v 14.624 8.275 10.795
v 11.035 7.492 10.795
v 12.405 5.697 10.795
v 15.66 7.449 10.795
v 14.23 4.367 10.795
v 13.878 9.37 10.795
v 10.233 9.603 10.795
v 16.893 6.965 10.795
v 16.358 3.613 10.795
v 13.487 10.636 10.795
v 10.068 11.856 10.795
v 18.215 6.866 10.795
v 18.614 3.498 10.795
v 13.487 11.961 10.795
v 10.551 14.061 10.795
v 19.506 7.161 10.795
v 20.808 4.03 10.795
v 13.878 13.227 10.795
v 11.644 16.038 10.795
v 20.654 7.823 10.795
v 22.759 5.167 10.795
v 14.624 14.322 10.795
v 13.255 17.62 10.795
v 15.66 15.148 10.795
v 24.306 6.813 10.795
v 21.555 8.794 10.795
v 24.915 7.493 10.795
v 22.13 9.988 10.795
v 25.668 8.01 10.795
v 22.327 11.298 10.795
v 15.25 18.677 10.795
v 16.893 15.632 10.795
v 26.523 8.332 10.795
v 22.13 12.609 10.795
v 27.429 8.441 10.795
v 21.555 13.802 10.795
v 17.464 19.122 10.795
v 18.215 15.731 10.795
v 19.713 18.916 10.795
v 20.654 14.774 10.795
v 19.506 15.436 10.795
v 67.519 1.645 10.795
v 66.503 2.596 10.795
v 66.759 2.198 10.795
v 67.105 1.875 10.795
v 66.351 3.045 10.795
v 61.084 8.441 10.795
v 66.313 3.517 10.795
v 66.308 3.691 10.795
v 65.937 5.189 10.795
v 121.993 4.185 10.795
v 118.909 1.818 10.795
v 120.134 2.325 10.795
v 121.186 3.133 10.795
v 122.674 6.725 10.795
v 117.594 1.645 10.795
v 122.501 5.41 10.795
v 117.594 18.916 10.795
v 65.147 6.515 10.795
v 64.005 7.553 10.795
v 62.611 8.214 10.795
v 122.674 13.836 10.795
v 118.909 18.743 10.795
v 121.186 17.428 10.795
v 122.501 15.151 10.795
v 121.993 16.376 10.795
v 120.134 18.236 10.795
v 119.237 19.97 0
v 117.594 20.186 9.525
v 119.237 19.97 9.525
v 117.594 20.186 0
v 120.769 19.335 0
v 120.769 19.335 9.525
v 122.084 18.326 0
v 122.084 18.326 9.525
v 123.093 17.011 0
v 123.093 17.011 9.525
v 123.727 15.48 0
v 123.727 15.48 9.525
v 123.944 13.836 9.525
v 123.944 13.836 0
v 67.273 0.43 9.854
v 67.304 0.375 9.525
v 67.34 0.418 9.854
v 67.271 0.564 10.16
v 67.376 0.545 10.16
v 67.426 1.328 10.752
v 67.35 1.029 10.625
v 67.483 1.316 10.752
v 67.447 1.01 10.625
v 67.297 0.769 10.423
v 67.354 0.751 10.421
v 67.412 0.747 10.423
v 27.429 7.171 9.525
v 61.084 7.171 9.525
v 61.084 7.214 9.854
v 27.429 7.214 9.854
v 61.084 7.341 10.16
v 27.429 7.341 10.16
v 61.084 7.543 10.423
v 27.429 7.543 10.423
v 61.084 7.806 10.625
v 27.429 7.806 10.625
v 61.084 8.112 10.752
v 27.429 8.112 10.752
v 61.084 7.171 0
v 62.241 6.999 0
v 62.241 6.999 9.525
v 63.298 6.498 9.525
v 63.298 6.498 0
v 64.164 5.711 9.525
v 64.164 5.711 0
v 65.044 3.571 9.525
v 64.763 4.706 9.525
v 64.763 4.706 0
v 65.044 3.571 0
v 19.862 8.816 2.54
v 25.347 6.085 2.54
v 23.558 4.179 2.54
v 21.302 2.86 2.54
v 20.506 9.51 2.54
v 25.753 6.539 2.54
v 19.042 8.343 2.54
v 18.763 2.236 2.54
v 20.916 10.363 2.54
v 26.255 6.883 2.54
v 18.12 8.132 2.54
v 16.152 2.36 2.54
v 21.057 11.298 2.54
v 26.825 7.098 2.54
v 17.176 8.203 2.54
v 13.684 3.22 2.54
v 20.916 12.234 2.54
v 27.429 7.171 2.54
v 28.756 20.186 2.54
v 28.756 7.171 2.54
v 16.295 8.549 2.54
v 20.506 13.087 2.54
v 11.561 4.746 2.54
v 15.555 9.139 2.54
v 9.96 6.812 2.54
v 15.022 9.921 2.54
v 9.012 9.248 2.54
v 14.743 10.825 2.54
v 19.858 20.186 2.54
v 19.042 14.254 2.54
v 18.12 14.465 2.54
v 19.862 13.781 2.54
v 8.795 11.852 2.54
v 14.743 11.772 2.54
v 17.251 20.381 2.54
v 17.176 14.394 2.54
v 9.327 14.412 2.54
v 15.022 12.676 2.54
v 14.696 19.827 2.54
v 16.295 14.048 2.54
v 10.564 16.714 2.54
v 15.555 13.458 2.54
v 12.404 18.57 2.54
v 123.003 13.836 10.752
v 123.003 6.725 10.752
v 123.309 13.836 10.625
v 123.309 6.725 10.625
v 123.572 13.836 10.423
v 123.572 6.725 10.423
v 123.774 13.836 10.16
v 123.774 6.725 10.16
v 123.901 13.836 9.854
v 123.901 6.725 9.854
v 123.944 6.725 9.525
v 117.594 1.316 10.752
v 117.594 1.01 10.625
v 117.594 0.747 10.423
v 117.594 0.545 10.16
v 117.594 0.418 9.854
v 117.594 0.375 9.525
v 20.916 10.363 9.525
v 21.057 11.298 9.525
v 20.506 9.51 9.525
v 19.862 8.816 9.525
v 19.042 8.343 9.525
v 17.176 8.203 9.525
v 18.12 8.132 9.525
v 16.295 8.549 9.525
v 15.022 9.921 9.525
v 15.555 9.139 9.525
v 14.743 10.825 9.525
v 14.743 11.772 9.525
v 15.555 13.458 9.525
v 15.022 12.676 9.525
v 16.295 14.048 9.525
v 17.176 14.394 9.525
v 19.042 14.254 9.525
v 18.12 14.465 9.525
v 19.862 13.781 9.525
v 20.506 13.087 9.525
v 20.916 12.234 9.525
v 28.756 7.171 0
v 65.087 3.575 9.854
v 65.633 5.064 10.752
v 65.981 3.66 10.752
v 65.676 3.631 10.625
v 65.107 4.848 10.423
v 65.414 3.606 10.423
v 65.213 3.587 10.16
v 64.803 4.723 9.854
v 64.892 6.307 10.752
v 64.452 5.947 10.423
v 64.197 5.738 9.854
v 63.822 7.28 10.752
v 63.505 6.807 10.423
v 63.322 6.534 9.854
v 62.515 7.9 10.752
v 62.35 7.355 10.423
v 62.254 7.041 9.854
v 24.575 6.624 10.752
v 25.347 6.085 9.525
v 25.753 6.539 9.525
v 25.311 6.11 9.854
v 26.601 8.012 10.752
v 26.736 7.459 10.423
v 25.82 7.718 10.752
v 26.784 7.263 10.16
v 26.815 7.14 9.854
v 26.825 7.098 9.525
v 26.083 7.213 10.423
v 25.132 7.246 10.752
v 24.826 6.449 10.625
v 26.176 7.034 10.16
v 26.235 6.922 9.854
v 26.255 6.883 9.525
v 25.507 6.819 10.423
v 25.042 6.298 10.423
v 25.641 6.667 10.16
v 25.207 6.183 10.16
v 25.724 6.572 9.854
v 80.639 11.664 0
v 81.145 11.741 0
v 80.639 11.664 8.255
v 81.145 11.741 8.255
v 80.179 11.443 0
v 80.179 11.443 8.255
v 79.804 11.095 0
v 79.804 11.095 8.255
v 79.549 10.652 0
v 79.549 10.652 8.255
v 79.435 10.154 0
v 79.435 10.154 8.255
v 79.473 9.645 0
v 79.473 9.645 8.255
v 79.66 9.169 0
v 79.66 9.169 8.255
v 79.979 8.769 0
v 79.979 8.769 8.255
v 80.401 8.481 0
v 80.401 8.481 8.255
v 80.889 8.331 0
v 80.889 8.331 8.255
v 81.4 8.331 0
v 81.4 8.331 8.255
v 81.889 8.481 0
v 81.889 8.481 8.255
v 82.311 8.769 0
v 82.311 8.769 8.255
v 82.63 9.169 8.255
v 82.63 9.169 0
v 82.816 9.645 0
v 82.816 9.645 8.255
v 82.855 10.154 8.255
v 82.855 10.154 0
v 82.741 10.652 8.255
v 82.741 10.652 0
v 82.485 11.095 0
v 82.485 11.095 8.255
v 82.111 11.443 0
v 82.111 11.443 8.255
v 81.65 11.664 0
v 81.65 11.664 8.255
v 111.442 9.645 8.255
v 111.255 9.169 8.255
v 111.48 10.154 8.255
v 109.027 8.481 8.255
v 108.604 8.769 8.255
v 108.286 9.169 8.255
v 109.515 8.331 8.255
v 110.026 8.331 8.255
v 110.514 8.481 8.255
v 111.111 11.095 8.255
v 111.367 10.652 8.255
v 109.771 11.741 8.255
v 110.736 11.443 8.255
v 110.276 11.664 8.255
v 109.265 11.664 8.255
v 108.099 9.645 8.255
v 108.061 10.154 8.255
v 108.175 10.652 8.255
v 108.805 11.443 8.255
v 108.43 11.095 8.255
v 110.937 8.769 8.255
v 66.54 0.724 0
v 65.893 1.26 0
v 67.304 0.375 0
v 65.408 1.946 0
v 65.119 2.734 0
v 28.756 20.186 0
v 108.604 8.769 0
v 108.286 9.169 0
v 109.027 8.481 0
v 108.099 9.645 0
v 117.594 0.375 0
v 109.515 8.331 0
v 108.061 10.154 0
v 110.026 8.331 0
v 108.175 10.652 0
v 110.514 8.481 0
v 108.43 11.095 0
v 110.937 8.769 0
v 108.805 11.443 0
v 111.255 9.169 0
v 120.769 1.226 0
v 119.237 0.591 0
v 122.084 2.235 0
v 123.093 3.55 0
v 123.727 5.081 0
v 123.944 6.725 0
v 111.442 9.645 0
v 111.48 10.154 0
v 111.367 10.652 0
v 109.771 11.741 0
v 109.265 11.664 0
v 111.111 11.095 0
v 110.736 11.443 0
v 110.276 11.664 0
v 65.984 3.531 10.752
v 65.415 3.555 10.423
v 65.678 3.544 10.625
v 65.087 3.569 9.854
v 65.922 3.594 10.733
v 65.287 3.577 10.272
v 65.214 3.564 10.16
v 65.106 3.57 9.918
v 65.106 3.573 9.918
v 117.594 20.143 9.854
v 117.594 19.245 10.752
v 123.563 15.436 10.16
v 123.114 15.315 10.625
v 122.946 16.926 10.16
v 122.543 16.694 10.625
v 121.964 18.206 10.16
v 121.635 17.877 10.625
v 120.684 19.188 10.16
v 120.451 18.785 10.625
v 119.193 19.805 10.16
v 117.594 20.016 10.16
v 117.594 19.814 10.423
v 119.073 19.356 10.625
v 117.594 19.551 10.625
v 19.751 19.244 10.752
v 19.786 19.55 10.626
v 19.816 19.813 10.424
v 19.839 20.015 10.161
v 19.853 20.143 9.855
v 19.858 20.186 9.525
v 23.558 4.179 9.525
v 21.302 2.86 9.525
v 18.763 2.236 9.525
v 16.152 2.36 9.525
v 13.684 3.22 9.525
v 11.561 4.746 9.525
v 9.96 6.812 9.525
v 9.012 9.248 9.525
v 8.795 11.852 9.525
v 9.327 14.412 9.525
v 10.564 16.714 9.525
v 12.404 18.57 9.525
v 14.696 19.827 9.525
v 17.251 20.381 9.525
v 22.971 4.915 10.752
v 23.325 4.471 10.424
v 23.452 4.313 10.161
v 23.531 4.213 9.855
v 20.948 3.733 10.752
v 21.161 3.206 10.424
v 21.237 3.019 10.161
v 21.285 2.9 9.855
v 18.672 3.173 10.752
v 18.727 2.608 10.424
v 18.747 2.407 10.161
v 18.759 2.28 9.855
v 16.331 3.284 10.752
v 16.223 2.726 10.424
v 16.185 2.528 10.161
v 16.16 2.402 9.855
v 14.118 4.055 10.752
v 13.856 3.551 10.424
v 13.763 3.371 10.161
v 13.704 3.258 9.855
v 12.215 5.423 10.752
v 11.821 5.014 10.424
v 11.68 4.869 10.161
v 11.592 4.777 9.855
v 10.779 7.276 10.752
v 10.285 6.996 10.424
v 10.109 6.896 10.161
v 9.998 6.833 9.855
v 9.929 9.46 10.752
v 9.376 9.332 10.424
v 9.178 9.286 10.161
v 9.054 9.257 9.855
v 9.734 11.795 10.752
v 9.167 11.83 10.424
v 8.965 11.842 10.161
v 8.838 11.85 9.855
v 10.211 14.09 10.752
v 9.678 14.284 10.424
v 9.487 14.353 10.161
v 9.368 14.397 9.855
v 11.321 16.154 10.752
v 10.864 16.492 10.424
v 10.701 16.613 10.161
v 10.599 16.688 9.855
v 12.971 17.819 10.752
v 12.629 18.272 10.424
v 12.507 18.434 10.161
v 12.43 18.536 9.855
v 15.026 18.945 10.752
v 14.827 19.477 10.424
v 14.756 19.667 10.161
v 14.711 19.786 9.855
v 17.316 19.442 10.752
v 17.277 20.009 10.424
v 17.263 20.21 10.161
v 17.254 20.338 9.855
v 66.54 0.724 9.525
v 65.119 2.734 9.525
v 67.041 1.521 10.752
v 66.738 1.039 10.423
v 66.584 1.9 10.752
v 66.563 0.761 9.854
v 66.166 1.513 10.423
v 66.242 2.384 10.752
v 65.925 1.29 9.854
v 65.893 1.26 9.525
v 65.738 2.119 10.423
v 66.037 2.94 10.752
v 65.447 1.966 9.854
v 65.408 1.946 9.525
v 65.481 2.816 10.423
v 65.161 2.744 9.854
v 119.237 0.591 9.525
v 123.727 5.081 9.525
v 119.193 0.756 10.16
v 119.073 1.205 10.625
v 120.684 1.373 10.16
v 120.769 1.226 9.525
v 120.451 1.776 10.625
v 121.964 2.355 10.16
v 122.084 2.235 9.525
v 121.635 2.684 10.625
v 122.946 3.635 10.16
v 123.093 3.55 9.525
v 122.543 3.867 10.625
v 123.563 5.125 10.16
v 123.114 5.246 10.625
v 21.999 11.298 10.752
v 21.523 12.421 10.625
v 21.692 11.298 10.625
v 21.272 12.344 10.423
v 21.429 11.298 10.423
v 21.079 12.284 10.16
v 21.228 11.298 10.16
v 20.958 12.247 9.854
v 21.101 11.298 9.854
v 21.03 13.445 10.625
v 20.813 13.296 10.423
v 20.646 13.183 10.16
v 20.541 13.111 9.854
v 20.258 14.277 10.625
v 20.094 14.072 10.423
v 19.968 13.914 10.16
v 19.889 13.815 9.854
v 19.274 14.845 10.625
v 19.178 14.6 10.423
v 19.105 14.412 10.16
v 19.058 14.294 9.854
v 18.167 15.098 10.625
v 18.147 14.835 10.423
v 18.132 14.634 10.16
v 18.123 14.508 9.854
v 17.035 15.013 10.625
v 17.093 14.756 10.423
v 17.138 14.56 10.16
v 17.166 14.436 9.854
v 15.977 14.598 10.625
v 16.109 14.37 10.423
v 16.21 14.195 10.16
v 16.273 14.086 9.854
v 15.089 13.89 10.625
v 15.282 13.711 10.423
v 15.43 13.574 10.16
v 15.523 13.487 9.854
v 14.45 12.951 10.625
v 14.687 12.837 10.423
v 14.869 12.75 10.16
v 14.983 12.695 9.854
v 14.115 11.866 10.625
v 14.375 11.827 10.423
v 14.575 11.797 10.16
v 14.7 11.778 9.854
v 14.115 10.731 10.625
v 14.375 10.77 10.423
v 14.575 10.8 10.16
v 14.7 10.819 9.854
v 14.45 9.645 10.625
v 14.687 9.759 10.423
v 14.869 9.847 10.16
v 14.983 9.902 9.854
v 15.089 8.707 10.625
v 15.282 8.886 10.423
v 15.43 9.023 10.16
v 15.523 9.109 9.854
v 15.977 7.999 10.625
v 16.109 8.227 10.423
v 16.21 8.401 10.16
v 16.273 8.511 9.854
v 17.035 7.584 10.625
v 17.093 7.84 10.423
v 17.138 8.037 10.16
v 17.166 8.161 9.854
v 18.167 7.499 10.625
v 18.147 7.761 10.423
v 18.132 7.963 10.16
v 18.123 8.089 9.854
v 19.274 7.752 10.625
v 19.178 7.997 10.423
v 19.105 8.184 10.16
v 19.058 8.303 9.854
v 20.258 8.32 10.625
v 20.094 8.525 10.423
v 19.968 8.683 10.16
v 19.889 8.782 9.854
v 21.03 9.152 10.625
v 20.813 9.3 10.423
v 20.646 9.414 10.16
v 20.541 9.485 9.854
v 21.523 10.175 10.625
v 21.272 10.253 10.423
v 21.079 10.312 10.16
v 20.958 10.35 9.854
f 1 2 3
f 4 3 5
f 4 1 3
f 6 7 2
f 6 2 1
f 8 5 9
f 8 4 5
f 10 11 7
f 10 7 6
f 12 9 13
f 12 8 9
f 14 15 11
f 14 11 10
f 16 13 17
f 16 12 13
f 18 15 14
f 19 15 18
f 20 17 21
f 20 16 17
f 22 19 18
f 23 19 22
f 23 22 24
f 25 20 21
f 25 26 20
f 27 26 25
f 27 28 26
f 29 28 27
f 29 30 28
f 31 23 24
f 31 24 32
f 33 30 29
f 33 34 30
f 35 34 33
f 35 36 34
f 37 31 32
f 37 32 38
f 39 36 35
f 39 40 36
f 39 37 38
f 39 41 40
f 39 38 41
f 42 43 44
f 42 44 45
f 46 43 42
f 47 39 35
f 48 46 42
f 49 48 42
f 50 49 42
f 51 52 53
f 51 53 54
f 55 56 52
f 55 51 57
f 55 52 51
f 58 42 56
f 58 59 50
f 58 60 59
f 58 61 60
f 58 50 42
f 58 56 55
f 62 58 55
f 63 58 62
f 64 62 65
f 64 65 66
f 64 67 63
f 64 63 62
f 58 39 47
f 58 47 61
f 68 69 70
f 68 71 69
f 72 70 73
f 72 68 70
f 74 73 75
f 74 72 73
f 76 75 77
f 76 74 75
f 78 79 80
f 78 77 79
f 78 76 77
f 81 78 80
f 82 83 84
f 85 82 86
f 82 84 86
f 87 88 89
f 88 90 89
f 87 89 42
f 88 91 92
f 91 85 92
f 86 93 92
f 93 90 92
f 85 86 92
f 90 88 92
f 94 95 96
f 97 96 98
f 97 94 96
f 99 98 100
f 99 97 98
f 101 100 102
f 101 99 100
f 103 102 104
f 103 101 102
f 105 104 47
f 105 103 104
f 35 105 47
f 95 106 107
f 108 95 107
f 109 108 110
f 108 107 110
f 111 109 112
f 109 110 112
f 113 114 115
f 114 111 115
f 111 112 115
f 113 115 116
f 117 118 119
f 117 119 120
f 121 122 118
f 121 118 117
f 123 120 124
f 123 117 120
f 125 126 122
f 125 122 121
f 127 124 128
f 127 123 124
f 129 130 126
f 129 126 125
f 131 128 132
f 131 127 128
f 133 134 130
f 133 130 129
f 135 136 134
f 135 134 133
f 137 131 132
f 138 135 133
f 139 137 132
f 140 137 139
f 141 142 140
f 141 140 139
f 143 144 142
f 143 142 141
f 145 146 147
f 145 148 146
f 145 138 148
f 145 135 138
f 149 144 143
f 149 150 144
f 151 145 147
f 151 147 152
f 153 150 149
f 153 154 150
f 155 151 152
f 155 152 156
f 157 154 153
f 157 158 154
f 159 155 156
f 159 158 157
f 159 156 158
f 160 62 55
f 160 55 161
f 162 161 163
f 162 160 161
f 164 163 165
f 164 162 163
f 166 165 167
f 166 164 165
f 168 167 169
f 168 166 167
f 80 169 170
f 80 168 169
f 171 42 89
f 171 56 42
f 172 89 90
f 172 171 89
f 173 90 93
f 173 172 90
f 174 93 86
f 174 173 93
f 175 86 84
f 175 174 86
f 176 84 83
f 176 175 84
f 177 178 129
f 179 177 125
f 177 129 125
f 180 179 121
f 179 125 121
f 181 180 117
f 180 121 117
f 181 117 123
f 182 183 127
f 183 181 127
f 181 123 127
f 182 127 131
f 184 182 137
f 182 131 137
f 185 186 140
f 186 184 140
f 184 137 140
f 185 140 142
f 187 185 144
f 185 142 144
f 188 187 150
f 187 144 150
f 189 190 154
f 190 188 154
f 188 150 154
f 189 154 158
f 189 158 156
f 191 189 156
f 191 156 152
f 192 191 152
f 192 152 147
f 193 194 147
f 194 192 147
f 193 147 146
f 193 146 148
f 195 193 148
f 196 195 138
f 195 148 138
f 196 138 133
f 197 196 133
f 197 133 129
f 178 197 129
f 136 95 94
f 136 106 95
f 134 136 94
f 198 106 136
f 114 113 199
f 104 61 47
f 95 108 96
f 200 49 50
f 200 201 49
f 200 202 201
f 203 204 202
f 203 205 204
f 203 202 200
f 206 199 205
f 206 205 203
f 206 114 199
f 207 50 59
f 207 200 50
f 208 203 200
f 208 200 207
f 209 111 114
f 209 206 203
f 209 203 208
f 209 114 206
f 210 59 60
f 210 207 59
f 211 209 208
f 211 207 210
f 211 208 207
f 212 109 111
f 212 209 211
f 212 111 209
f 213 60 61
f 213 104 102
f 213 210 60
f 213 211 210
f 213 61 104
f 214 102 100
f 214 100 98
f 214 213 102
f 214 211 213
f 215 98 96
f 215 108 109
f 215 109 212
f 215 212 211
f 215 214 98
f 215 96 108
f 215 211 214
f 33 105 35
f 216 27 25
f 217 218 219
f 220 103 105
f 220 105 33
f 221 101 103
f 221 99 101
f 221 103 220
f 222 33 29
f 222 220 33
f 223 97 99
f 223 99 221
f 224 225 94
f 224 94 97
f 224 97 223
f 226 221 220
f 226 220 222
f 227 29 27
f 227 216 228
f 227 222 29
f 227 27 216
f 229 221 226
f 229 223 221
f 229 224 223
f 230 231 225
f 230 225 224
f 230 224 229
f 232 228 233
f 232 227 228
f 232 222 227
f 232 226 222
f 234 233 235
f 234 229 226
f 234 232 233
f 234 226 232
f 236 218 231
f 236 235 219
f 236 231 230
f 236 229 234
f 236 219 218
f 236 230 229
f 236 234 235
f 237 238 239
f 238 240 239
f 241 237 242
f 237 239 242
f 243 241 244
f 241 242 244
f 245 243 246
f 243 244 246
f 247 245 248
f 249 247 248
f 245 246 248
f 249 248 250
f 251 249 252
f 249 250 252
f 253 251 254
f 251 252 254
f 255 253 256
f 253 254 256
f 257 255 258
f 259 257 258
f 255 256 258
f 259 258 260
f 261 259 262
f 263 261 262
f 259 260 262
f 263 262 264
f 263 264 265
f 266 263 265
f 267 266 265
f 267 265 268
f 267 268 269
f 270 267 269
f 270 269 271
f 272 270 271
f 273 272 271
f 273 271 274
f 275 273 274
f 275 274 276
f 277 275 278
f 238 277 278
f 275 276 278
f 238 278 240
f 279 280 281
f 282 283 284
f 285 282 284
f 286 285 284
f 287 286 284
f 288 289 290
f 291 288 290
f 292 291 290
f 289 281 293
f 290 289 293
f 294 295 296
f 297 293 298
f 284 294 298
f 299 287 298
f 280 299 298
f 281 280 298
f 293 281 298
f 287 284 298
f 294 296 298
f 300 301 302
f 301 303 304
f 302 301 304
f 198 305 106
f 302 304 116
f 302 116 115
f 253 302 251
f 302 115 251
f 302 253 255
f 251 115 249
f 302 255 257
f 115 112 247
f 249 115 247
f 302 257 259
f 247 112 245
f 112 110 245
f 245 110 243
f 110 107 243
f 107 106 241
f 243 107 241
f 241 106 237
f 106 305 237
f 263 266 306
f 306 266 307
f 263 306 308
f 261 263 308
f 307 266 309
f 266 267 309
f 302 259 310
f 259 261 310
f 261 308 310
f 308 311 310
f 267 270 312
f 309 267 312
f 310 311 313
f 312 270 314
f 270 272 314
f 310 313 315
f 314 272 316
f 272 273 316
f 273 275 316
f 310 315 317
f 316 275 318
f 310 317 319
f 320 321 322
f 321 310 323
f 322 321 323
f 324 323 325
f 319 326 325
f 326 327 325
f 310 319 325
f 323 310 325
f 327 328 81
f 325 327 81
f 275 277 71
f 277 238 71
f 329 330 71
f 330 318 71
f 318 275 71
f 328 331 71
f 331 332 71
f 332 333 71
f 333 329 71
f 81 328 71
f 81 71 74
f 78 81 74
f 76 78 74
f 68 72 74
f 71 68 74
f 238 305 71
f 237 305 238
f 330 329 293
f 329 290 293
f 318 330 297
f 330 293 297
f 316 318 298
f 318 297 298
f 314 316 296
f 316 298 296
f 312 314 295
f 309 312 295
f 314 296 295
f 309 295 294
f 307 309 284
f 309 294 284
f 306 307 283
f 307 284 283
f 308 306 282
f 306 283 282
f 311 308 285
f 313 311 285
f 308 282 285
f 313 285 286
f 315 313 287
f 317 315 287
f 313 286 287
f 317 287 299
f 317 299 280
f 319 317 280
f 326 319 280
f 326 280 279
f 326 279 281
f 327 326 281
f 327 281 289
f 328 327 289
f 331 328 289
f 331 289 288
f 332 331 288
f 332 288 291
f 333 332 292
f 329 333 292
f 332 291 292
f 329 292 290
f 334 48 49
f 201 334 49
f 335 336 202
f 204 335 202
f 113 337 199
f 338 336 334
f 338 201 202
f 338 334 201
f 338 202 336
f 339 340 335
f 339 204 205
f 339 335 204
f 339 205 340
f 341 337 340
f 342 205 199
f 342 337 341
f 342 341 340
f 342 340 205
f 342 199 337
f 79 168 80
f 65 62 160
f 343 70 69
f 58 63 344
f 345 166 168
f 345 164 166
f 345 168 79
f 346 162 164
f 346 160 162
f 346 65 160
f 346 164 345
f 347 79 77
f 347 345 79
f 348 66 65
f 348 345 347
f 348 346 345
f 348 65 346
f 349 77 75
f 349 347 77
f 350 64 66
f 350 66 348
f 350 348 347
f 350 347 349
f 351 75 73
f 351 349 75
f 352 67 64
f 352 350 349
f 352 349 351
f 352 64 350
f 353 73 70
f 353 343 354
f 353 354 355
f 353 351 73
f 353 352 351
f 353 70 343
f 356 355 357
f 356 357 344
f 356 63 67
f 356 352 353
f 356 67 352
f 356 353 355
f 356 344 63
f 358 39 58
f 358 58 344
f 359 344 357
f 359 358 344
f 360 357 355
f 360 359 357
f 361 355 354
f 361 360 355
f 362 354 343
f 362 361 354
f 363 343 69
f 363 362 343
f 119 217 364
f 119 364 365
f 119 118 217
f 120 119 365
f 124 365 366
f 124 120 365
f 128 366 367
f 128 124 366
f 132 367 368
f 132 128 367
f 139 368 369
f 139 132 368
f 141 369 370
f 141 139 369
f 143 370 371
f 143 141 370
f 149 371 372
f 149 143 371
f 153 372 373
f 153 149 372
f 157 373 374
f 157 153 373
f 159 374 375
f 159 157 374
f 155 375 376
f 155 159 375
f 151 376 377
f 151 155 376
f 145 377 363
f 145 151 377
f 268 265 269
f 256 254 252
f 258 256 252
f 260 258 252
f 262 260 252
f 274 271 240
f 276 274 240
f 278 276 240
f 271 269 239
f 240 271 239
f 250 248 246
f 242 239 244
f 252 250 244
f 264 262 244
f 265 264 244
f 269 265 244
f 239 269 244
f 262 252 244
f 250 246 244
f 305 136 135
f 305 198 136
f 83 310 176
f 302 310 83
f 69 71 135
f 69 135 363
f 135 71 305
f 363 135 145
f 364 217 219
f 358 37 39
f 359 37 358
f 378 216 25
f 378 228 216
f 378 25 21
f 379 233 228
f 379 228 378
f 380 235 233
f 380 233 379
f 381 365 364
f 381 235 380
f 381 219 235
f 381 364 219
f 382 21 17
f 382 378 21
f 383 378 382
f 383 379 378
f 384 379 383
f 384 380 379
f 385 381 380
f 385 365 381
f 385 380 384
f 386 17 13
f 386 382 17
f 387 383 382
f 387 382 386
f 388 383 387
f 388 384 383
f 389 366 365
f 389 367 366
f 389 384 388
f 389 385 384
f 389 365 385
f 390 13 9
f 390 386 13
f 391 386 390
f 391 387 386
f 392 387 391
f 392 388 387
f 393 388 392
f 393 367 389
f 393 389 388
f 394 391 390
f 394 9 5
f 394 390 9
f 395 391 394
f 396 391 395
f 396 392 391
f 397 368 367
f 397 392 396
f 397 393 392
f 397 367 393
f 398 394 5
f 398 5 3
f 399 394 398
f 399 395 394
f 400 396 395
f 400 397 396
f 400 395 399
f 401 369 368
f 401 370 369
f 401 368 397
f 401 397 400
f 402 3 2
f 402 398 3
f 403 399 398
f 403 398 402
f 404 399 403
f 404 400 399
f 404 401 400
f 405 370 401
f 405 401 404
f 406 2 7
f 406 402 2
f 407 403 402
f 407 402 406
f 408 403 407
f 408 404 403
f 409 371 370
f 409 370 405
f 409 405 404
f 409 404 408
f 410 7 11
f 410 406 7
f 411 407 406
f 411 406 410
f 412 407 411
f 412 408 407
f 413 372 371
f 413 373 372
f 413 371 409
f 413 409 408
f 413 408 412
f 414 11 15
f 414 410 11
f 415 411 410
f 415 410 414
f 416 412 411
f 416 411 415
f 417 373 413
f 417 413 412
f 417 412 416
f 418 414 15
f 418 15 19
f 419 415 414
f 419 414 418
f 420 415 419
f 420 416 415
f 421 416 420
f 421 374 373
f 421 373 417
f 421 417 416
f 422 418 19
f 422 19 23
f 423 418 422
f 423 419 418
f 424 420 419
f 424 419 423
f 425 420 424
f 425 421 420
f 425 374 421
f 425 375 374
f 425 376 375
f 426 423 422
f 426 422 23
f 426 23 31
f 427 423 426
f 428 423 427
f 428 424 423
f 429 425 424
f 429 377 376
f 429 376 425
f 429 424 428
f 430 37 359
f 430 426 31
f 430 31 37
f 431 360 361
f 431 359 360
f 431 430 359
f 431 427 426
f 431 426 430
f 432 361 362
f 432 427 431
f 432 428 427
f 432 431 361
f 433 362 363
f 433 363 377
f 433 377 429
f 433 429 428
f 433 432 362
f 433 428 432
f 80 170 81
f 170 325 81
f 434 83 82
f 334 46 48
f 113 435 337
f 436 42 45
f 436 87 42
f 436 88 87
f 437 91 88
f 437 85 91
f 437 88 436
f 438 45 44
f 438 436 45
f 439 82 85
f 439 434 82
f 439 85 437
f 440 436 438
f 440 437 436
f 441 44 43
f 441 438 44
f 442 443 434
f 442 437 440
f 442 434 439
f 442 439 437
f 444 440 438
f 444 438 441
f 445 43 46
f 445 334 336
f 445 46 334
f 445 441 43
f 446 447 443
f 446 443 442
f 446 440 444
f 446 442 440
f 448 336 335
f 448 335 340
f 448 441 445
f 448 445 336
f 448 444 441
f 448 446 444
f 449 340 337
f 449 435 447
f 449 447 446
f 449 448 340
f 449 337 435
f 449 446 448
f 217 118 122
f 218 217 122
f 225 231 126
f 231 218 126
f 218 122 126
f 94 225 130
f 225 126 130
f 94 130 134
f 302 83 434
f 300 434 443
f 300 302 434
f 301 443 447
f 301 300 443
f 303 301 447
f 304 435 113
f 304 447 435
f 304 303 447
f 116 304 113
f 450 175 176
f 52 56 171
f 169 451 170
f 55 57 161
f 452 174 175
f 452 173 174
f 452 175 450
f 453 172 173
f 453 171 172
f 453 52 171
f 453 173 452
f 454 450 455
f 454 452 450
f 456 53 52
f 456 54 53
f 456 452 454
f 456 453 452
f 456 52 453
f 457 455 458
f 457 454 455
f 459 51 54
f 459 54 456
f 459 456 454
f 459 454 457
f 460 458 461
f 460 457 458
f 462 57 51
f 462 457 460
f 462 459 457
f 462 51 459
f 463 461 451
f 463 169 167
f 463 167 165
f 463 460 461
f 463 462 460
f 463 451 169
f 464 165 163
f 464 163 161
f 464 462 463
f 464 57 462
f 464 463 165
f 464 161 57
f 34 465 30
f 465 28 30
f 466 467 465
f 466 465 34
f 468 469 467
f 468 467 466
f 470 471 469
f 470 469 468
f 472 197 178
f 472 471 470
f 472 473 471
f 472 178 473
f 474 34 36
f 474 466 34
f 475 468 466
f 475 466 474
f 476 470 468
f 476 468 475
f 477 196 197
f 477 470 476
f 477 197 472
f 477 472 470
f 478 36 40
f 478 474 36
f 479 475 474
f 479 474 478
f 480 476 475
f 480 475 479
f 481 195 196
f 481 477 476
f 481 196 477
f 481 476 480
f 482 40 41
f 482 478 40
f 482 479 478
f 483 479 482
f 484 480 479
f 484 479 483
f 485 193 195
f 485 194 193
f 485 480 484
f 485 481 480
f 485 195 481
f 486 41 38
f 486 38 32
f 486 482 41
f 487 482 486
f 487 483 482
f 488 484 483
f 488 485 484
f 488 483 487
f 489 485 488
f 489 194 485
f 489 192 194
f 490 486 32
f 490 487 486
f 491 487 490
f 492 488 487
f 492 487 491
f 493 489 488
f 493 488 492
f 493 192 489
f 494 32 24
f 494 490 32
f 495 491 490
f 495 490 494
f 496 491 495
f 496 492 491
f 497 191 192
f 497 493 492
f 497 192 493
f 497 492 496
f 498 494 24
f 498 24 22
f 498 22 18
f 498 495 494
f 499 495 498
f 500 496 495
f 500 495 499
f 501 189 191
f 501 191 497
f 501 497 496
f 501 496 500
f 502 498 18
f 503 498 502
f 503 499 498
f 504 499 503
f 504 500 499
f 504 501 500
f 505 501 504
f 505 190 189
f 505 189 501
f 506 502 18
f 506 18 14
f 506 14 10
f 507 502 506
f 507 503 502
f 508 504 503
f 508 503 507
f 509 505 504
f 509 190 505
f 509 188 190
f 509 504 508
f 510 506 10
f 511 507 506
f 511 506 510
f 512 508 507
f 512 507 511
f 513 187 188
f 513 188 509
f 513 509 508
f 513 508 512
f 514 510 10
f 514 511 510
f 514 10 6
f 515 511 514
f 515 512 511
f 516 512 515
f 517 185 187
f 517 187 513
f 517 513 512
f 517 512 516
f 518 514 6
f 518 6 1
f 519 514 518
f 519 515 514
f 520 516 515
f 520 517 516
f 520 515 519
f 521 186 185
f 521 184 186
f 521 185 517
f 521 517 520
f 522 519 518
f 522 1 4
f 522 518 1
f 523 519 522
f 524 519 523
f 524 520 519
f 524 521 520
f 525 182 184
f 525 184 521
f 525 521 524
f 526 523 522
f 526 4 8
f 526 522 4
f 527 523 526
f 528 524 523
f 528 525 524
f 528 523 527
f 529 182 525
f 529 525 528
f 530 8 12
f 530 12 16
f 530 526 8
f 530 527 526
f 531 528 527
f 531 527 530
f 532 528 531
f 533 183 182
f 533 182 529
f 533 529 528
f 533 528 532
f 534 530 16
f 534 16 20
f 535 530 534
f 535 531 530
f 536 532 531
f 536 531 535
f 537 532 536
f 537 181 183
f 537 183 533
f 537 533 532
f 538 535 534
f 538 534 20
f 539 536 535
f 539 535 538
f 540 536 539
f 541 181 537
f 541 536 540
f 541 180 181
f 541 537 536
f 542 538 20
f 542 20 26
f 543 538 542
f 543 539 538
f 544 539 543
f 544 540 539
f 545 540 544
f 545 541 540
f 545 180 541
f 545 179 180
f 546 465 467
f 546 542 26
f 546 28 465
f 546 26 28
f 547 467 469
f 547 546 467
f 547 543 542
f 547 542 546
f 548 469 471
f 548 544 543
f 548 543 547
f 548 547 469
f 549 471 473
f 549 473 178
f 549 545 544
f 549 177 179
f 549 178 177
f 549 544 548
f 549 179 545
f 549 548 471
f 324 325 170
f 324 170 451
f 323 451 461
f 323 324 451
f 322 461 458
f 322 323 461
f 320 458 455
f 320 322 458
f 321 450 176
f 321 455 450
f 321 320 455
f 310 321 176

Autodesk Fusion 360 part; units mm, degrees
sketch "Main Body" plane through (0, 0, 0) normal (0, 0, 1) x (1, 0, 0)
  line L0 (123.9438, 6.7249) -> (123.9438, 13.8361)
  arc A0 (117.5938, 0.3749) -> (123.9438, 6.7249) centre (117.5938, 6.7249) ccw
  line L1 (123.9438, 6.7249) -> (64.5078, 6.7249) construction
  line L2 (117.5938, 0.3749) -> (67.3042, 0.3749)
  line L3 (61.0843, 7.1711) -> (27.4293, 7.1711)
  arc A1 (65.0438, 3.571) -> (61.0843, 7.1711) centre (61.0843, 3.1937) ccw
  arc A2 (65.0438, 3.571) -> (67.3042, 0.3749) centre (68.2411, 3.4349) ccw
  circle A3 centre (17.8824, 11.2984) radius 3.175
  line L4 (117.5938, 20.1861) -> (19.8575, 20.1861)
  arc A4 (19.8575, 20.1861) -> (25.3469, 6.0854) centre (17.8824, 11.2984) ccw
  arc A5 (27.4293, 7.1711) -> (25.3469, 6.0854) centre (27.4293, 4.6311) ccw
  arc A6 (123.9438, 13.8361) -> (117.5938, 20.1861) centre (117.5938, 13.8361) ccw
  point P0 (123.9438, 8.0934)
  dimension "d173" = 6.35
  dimension "d175" = 59.436
  dimension "d178" = 6.35
  dimension "d221" = 2.54
  dimension "d223" = 50.2896
  dimension "d229" = 6.35
  dimension "d230" = 33.655
extrude "Extrude2" add sketch "Main Body" along normal blind 10.795
ref_plane "WorkPlane2" through (65.2693, 10.7273, 0) normal (0, 0, -1) x (-1, 0, 0)
sketch "Cut out for Actuator" plane through (0, 0, 0) normal (0, 0, -1) x (-1, 0, 0)
  line L0 (-3.356, 0.6564) -> (-28.756, 0.6564)
  line L1 (-28.756, 0.6564) -> (-28.756, 21.8424)
  line L2 (-28.756, 21.8424) -> (-3.356, 21.8424)
  line L3 (-3.356, 21.8424) -> (-3.356, 0.6564)
  dimension "d205" = 25.4
extrude "Extrude7" cut sketch "Cut out for Actuator" against normal blind 2.54
hole "Hole3" at (109.7706, 10.0261, 0) direction (0, 0, 1) diameter 3.429 depth 8.255 tip angle 180
hole "Hole4" at (81.1448, 10.0261, 0) direction (0, 0, 1) diameter 3.429 depth 8.255 tip angle 180
fillet "Fillet1" radius 1.27 1 faces at (100.8306, 6.9786, 10.795)
